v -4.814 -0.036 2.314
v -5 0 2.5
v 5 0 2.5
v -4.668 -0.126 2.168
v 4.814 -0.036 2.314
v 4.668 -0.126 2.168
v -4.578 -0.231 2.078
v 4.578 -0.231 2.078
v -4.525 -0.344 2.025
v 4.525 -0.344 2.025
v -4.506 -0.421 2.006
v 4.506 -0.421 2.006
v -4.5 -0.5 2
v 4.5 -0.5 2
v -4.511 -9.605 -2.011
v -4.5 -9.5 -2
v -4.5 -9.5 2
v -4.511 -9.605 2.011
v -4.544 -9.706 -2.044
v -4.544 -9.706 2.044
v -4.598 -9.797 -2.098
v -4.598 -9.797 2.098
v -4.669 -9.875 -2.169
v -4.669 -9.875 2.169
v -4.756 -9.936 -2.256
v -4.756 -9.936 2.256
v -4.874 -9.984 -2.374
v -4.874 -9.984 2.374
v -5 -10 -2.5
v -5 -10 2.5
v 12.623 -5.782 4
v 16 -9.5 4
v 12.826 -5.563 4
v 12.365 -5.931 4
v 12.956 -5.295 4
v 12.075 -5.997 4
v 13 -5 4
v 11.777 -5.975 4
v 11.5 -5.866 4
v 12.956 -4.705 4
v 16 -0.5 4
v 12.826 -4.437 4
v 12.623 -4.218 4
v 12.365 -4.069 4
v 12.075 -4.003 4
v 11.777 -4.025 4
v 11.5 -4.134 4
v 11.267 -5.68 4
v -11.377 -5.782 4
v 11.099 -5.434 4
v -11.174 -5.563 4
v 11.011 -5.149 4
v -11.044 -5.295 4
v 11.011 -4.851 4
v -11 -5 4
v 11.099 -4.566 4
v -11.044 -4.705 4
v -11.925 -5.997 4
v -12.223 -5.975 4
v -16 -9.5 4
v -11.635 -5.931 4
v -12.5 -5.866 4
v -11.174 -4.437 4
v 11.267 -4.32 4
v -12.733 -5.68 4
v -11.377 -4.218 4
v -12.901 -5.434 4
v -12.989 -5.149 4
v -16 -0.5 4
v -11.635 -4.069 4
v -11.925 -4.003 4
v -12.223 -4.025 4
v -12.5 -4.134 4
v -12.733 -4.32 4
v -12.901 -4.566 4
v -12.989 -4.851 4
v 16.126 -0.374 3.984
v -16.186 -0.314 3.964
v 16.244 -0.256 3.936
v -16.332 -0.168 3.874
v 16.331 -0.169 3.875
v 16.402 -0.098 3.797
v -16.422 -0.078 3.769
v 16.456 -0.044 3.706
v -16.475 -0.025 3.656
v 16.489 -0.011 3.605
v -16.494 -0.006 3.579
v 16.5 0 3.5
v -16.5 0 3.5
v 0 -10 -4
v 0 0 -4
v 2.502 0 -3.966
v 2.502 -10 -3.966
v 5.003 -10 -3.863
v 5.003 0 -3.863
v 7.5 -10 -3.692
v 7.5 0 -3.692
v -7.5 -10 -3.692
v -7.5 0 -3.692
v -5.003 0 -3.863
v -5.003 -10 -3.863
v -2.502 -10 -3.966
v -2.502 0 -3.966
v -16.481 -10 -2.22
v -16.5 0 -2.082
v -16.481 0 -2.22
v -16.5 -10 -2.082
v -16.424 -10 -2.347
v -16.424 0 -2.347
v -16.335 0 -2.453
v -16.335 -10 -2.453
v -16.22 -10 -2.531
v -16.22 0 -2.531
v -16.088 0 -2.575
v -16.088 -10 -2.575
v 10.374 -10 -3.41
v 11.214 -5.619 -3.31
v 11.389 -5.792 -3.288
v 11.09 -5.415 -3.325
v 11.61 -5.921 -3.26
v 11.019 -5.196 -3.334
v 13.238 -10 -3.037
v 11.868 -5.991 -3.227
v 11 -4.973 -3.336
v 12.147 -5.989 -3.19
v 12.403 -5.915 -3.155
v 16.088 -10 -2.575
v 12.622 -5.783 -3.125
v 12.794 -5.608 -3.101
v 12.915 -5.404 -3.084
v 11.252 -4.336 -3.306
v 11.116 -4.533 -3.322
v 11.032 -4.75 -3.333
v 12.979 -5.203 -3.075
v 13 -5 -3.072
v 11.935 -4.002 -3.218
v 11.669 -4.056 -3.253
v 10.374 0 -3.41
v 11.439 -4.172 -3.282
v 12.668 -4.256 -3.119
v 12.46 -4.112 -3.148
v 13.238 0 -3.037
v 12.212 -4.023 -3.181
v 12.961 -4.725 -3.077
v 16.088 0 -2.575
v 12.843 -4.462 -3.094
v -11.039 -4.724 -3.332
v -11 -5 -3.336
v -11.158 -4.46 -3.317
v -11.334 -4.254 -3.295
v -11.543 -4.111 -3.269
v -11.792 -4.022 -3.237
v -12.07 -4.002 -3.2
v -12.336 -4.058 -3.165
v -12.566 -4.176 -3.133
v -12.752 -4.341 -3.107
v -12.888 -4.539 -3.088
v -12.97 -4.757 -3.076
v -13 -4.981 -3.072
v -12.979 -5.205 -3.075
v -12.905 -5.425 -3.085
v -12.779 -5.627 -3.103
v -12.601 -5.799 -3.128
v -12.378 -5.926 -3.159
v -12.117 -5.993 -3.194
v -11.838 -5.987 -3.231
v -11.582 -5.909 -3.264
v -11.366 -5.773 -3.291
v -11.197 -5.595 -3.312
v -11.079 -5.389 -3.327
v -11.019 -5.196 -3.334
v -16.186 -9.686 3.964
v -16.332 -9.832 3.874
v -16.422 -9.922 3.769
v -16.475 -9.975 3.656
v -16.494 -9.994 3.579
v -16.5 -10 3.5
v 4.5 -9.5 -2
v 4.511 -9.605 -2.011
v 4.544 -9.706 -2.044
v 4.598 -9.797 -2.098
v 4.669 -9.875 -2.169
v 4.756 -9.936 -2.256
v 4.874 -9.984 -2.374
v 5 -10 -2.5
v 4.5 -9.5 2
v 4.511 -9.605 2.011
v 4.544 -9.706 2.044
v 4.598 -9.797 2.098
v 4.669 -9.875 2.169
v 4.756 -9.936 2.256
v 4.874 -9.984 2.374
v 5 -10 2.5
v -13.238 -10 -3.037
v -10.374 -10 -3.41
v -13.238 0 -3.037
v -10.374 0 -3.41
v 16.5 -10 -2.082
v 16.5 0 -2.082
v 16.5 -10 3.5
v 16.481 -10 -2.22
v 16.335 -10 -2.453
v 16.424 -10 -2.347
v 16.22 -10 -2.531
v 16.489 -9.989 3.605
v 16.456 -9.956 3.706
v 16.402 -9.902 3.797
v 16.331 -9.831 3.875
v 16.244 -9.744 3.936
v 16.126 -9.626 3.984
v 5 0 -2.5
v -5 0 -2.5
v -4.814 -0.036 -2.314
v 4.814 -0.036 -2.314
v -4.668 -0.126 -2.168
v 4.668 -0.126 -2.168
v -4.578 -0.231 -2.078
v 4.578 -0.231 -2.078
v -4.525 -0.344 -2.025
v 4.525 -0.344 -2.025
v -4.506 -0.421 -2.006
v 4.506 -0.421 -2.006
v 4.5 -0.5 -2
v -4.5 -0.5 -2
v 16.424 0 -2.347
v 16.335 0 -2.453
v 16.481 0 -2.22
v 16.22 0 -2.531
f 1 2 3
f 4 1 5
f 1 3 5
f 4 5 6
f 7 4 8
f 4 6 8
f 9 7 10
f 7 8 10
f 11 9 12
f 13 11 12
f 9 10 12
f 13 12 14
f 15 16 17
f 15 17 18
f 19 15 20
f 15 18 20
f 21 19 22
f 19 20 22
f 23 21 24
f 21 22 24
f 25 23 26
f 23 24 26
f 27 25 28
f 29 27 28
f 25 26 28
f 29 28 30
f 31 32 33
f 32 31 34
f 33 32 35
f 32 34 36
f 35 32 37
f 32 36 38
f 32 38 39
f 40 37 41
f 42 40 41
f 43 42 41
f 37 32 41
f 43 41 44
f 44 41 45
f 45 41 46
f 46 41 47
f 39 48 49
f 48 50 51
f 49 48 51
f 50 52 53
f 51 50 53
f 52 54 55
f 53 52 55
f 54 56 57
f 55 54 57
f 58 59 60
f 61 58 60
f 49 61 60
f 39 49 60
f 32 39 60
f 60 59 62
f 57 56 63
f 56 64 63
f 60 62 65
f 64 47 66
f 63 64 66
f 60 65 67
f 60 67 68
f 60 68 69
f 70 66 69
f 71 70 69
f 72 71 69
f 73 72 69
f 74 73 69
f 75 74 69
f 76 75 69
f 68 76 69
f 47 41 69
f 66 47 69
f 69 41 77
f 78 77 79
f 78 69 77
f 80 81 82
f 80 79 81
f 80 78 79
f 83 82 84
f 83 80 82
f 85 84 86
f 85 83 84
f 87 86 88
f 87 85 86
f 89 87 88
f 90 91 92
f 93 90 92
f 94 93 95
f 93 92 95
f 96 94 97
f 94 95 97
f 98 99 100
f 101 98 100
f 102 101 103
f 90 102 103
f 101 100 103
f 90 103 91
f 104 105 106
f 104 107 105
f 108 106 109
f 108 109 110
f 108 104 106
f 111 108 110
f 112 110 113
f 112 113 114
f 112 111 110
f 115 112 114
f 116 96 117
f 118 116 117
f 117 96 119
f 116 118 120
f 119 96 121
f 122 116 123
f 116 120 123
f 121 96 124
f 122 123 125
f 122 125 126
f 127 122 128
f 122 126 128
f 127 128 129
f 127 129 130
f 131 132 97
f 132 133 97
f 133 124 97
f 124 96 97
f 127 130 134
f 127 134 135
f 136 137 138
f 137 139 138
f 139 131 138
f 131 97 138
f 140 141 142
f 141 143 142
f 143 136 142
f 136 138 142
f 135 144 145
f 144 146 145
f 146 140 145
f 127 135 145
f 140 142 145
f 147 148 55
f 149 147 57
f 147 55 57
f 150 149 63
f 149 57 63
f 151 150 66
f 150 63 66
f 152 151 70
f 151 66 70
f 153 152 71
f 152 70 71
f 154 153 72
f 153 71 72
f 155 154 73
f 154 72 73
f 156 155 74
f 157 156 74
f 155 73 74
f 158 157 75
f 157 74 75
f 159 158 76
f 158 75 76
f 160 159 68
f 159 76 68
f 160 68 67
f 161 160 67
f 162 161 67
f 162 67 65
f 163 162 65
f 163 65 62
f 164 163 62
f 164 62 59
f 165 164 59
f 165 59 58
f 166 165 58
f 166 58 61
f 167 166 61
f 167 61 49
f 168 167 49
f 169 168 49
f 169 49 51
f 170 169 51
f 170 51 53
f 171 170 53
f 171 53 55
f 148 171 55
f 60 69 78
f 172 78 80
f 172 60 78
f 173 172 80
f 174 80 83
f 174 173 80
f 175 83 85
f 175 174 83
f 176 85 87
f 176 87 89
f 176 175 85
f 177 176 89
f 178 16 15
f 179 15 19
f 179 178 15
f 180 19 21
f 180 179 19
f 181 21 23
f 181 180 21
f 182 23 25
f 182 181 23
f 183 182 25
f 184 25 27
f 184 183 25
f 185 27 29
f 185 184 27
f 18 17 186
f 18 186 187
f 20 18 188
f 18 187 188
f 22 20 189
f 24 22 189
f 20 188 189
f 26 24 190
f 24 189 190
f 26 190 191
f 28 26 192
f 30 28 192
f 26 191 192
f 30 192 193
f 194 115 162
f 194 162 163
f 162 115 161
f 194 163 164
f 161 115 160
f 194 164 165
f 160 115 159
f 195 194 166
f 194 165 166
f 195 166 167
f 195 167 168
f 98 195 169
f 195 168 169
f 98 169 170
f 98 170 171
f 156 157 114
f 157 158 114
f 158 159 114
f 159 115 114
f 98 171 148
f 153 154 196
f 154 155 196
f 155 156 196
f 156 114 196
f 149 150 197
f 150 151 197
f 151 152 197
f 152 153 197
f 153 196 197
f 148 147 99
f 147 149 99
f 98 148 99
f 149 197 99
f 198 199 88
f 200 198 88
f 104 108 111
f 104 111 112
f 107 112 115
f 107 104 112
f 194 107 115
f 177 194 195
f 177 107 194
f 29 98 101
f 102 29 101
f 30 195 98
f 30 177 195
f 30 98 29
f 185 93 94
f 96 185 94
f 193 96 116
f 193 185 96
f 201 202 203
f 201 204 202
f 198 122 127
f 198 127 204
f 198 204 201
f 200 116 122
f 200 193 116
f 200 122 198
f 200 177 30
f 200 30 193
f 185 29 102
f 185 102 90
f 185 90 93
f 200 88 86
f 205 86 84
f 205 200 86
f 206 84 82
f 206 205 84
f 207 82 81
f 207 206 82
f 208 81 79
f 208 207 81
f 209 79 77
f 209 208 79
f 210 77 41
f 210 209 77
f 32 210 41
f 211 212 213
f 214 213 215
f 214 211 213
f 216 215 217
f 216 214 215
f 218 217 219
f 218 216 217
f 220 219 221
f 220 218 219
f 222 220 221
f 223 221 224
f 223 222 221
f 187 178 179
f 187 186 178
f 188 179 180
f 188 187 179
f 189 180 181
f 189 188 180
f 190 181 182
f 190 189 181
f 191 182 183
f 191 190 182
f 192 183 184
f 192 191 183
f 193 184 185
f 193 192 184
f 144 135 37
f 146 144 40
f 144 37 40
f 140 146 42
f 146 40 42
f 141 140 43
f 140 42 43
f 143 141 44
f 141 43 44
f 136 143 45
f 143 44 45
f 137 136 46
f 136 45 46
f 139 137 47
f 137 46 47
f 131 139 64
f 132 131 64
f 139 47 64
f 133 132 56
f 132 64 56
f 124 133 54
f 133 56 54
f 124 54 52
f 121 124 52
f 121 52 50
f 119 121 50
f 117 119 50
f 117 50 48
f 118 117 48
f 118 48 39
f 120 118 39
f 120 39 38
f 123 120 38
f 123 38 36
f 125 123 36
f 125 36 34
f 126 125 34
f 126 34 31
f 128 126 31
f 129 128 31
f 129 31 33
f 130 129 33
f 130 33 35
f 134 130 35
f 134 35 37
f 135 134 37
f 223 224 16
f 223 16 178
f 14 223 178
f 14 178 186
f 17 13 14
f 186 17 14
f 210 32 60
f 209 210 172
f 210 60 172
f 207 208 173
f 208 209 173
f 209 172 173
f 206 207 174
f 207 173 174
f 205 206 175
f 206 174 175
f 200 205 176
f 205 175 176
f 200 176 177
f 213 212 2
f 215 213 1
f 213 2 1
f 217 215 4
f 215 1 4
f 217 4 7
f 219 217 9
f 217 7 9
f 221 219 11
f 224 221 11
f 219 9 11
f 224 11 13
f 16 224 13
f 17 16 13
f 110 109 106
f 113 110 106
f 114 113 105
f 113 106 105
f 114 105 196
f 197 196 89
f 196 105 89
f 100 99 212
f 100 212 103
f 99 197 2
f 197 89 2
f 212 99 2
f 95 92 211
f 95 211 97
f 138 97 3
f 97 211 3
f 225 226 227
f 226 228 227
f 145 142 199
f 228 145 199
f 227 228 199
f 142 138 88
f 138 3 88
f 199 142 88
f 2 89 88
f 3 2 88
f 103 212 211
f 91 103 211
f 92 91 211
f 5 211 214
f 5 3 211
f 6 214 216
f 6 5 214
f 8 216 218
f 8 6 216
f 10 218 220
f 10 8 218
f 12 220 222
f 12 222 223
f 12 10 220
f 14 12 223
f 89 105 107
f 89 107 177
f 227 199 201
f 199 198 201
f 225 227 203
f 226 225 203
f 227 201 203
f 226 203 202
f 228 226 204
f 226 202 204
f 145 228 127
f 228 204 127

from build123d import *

# Parameters (mm, degrees)
F0_W     = 9
F0_H     = 4
F0_H_2   = 6.5
F1_DEPTH = 10
F2_R     = 0.5
F3_R     = 1
F4_DEPTH = 25


with BuildPart() as f1:
    # F0 (on Front) → F1 (new body)
    with BuildSketch(Plane.XZ):
        with BuildLine():
            ThreePointArc((-7.5, -3.6921049214), (-3.753158649, -3.9229938263), (0, -4))
            Line((0, -4), (0, -2.5))
            Line((0, -2.5), (-7.5, -2.5))
            Line((-7.5, -2.5), (-7.5, -3.6921049214))
        make_face()
        with BuildLine():
            Line((0, -2.5), (0, -4))
            ThreePointArc((0, -4), (3.753158649, -3.9229938263), (7.5, -3.6921049214))
            Line((7.5, -3.6921049214), (7.5, -2.5))
            Line((7.5, -2.5), (0, -2.5))
        make_face()
        with BuildLine():
            Line((7.5, -2.5), (7.5, -3.6921049214))
            ThreePointArc((7.5, -3.6921049214), (12.0147941529, -3.2077434482), (16.5, -2.5))
            Line((16.5, -2.5), (7.5, -2.5))
        make_face()
        Polygon((-7.5, -2.5), (0, -2.5), (7.5, -2.5), (7.5, 4), (-7.5, 4), align=None)
        Rectangle(F0_W, F0_H, mode=Mode.SUBTRACT)
        with BuildLine():
            ThreePointArc((-16.5, -2.5), (-12.0147941529, -3.2077434482), (-7.5, -3.6921049214))
            Line((-7.5, -3.6921049214), (-7.5, -2.5))
            Line((-7.5, -2.5), (-16.5, -2.5))
        make_face()
        with Locations((12, 0.75)):
            Rectangle(F0_W, F0_H_2)
        with Locations((-12, 0.75)):
            Rectangle(F0_W, F0_H_2)
    extrude(amount=F1_DEPTH)

    # F2 (call 1 of 5: OpenCascade refuses the feature's edges together)
    f2_edges = [f1.edges().sort_by_distance(p)[0] for p in [
        (16.5, -5, 4),
        (-16.5, -5, 4),
        (0, -10, 4),
        (0, 0, 4),
    ]]
    fillet(f2_edges, radius=F2_R)

    # F2#2 (call 2 of 5)
    f2_2_edges = [f1.edges().sort_by_distance(p)[0] for p in [
        (16.5, -5, -2.5),
    ]]
    fillet(f2_2_edges, radius=F2_R)

    # F2#3 (call 3 of 5)
    f2_3_edges = [f1.edges().sort_by_distance(p)[0] for p in [
        (-16.5, -5, -2.5),
    ]]
    fillet(f2_3_edges, radius=F2_R)

    # F2#4 (call 4 of 5)
    f2_4_edges = [f1.edges().sort_by_distance(p)[0] for p in [
        (-4.5, 0, 0),
        (0, 0, 2),
        (4.5, 0, 0),
        (0, 0, -2),
    ]]
    fillet(f2_4_edges, radius=F2_R)

    # F2#5 (call 5 of 5)
    f2_5_edges = [f1.edges().sort_by_distance(p)[0] for p in [
        (-4.5, -10, 0),
        (0, -10, 2),
        (4.5, -10, 0),
        (0, -10, -2),
    ]]
    fillet(f2_5_edges, radius=F2_R)

    # F3 (on face) → F4 (cut)
    with BuildSketch(Plane.XY.offset(4)):
        with Locations((-12, -5)):
            Circle(F3_R)
        with Locations((12, -5)):
            Circle(F3_R)
    extrude(amount=-F4_DEPTH, mode=Mode.SUBTRACT)


solid = f1.part
